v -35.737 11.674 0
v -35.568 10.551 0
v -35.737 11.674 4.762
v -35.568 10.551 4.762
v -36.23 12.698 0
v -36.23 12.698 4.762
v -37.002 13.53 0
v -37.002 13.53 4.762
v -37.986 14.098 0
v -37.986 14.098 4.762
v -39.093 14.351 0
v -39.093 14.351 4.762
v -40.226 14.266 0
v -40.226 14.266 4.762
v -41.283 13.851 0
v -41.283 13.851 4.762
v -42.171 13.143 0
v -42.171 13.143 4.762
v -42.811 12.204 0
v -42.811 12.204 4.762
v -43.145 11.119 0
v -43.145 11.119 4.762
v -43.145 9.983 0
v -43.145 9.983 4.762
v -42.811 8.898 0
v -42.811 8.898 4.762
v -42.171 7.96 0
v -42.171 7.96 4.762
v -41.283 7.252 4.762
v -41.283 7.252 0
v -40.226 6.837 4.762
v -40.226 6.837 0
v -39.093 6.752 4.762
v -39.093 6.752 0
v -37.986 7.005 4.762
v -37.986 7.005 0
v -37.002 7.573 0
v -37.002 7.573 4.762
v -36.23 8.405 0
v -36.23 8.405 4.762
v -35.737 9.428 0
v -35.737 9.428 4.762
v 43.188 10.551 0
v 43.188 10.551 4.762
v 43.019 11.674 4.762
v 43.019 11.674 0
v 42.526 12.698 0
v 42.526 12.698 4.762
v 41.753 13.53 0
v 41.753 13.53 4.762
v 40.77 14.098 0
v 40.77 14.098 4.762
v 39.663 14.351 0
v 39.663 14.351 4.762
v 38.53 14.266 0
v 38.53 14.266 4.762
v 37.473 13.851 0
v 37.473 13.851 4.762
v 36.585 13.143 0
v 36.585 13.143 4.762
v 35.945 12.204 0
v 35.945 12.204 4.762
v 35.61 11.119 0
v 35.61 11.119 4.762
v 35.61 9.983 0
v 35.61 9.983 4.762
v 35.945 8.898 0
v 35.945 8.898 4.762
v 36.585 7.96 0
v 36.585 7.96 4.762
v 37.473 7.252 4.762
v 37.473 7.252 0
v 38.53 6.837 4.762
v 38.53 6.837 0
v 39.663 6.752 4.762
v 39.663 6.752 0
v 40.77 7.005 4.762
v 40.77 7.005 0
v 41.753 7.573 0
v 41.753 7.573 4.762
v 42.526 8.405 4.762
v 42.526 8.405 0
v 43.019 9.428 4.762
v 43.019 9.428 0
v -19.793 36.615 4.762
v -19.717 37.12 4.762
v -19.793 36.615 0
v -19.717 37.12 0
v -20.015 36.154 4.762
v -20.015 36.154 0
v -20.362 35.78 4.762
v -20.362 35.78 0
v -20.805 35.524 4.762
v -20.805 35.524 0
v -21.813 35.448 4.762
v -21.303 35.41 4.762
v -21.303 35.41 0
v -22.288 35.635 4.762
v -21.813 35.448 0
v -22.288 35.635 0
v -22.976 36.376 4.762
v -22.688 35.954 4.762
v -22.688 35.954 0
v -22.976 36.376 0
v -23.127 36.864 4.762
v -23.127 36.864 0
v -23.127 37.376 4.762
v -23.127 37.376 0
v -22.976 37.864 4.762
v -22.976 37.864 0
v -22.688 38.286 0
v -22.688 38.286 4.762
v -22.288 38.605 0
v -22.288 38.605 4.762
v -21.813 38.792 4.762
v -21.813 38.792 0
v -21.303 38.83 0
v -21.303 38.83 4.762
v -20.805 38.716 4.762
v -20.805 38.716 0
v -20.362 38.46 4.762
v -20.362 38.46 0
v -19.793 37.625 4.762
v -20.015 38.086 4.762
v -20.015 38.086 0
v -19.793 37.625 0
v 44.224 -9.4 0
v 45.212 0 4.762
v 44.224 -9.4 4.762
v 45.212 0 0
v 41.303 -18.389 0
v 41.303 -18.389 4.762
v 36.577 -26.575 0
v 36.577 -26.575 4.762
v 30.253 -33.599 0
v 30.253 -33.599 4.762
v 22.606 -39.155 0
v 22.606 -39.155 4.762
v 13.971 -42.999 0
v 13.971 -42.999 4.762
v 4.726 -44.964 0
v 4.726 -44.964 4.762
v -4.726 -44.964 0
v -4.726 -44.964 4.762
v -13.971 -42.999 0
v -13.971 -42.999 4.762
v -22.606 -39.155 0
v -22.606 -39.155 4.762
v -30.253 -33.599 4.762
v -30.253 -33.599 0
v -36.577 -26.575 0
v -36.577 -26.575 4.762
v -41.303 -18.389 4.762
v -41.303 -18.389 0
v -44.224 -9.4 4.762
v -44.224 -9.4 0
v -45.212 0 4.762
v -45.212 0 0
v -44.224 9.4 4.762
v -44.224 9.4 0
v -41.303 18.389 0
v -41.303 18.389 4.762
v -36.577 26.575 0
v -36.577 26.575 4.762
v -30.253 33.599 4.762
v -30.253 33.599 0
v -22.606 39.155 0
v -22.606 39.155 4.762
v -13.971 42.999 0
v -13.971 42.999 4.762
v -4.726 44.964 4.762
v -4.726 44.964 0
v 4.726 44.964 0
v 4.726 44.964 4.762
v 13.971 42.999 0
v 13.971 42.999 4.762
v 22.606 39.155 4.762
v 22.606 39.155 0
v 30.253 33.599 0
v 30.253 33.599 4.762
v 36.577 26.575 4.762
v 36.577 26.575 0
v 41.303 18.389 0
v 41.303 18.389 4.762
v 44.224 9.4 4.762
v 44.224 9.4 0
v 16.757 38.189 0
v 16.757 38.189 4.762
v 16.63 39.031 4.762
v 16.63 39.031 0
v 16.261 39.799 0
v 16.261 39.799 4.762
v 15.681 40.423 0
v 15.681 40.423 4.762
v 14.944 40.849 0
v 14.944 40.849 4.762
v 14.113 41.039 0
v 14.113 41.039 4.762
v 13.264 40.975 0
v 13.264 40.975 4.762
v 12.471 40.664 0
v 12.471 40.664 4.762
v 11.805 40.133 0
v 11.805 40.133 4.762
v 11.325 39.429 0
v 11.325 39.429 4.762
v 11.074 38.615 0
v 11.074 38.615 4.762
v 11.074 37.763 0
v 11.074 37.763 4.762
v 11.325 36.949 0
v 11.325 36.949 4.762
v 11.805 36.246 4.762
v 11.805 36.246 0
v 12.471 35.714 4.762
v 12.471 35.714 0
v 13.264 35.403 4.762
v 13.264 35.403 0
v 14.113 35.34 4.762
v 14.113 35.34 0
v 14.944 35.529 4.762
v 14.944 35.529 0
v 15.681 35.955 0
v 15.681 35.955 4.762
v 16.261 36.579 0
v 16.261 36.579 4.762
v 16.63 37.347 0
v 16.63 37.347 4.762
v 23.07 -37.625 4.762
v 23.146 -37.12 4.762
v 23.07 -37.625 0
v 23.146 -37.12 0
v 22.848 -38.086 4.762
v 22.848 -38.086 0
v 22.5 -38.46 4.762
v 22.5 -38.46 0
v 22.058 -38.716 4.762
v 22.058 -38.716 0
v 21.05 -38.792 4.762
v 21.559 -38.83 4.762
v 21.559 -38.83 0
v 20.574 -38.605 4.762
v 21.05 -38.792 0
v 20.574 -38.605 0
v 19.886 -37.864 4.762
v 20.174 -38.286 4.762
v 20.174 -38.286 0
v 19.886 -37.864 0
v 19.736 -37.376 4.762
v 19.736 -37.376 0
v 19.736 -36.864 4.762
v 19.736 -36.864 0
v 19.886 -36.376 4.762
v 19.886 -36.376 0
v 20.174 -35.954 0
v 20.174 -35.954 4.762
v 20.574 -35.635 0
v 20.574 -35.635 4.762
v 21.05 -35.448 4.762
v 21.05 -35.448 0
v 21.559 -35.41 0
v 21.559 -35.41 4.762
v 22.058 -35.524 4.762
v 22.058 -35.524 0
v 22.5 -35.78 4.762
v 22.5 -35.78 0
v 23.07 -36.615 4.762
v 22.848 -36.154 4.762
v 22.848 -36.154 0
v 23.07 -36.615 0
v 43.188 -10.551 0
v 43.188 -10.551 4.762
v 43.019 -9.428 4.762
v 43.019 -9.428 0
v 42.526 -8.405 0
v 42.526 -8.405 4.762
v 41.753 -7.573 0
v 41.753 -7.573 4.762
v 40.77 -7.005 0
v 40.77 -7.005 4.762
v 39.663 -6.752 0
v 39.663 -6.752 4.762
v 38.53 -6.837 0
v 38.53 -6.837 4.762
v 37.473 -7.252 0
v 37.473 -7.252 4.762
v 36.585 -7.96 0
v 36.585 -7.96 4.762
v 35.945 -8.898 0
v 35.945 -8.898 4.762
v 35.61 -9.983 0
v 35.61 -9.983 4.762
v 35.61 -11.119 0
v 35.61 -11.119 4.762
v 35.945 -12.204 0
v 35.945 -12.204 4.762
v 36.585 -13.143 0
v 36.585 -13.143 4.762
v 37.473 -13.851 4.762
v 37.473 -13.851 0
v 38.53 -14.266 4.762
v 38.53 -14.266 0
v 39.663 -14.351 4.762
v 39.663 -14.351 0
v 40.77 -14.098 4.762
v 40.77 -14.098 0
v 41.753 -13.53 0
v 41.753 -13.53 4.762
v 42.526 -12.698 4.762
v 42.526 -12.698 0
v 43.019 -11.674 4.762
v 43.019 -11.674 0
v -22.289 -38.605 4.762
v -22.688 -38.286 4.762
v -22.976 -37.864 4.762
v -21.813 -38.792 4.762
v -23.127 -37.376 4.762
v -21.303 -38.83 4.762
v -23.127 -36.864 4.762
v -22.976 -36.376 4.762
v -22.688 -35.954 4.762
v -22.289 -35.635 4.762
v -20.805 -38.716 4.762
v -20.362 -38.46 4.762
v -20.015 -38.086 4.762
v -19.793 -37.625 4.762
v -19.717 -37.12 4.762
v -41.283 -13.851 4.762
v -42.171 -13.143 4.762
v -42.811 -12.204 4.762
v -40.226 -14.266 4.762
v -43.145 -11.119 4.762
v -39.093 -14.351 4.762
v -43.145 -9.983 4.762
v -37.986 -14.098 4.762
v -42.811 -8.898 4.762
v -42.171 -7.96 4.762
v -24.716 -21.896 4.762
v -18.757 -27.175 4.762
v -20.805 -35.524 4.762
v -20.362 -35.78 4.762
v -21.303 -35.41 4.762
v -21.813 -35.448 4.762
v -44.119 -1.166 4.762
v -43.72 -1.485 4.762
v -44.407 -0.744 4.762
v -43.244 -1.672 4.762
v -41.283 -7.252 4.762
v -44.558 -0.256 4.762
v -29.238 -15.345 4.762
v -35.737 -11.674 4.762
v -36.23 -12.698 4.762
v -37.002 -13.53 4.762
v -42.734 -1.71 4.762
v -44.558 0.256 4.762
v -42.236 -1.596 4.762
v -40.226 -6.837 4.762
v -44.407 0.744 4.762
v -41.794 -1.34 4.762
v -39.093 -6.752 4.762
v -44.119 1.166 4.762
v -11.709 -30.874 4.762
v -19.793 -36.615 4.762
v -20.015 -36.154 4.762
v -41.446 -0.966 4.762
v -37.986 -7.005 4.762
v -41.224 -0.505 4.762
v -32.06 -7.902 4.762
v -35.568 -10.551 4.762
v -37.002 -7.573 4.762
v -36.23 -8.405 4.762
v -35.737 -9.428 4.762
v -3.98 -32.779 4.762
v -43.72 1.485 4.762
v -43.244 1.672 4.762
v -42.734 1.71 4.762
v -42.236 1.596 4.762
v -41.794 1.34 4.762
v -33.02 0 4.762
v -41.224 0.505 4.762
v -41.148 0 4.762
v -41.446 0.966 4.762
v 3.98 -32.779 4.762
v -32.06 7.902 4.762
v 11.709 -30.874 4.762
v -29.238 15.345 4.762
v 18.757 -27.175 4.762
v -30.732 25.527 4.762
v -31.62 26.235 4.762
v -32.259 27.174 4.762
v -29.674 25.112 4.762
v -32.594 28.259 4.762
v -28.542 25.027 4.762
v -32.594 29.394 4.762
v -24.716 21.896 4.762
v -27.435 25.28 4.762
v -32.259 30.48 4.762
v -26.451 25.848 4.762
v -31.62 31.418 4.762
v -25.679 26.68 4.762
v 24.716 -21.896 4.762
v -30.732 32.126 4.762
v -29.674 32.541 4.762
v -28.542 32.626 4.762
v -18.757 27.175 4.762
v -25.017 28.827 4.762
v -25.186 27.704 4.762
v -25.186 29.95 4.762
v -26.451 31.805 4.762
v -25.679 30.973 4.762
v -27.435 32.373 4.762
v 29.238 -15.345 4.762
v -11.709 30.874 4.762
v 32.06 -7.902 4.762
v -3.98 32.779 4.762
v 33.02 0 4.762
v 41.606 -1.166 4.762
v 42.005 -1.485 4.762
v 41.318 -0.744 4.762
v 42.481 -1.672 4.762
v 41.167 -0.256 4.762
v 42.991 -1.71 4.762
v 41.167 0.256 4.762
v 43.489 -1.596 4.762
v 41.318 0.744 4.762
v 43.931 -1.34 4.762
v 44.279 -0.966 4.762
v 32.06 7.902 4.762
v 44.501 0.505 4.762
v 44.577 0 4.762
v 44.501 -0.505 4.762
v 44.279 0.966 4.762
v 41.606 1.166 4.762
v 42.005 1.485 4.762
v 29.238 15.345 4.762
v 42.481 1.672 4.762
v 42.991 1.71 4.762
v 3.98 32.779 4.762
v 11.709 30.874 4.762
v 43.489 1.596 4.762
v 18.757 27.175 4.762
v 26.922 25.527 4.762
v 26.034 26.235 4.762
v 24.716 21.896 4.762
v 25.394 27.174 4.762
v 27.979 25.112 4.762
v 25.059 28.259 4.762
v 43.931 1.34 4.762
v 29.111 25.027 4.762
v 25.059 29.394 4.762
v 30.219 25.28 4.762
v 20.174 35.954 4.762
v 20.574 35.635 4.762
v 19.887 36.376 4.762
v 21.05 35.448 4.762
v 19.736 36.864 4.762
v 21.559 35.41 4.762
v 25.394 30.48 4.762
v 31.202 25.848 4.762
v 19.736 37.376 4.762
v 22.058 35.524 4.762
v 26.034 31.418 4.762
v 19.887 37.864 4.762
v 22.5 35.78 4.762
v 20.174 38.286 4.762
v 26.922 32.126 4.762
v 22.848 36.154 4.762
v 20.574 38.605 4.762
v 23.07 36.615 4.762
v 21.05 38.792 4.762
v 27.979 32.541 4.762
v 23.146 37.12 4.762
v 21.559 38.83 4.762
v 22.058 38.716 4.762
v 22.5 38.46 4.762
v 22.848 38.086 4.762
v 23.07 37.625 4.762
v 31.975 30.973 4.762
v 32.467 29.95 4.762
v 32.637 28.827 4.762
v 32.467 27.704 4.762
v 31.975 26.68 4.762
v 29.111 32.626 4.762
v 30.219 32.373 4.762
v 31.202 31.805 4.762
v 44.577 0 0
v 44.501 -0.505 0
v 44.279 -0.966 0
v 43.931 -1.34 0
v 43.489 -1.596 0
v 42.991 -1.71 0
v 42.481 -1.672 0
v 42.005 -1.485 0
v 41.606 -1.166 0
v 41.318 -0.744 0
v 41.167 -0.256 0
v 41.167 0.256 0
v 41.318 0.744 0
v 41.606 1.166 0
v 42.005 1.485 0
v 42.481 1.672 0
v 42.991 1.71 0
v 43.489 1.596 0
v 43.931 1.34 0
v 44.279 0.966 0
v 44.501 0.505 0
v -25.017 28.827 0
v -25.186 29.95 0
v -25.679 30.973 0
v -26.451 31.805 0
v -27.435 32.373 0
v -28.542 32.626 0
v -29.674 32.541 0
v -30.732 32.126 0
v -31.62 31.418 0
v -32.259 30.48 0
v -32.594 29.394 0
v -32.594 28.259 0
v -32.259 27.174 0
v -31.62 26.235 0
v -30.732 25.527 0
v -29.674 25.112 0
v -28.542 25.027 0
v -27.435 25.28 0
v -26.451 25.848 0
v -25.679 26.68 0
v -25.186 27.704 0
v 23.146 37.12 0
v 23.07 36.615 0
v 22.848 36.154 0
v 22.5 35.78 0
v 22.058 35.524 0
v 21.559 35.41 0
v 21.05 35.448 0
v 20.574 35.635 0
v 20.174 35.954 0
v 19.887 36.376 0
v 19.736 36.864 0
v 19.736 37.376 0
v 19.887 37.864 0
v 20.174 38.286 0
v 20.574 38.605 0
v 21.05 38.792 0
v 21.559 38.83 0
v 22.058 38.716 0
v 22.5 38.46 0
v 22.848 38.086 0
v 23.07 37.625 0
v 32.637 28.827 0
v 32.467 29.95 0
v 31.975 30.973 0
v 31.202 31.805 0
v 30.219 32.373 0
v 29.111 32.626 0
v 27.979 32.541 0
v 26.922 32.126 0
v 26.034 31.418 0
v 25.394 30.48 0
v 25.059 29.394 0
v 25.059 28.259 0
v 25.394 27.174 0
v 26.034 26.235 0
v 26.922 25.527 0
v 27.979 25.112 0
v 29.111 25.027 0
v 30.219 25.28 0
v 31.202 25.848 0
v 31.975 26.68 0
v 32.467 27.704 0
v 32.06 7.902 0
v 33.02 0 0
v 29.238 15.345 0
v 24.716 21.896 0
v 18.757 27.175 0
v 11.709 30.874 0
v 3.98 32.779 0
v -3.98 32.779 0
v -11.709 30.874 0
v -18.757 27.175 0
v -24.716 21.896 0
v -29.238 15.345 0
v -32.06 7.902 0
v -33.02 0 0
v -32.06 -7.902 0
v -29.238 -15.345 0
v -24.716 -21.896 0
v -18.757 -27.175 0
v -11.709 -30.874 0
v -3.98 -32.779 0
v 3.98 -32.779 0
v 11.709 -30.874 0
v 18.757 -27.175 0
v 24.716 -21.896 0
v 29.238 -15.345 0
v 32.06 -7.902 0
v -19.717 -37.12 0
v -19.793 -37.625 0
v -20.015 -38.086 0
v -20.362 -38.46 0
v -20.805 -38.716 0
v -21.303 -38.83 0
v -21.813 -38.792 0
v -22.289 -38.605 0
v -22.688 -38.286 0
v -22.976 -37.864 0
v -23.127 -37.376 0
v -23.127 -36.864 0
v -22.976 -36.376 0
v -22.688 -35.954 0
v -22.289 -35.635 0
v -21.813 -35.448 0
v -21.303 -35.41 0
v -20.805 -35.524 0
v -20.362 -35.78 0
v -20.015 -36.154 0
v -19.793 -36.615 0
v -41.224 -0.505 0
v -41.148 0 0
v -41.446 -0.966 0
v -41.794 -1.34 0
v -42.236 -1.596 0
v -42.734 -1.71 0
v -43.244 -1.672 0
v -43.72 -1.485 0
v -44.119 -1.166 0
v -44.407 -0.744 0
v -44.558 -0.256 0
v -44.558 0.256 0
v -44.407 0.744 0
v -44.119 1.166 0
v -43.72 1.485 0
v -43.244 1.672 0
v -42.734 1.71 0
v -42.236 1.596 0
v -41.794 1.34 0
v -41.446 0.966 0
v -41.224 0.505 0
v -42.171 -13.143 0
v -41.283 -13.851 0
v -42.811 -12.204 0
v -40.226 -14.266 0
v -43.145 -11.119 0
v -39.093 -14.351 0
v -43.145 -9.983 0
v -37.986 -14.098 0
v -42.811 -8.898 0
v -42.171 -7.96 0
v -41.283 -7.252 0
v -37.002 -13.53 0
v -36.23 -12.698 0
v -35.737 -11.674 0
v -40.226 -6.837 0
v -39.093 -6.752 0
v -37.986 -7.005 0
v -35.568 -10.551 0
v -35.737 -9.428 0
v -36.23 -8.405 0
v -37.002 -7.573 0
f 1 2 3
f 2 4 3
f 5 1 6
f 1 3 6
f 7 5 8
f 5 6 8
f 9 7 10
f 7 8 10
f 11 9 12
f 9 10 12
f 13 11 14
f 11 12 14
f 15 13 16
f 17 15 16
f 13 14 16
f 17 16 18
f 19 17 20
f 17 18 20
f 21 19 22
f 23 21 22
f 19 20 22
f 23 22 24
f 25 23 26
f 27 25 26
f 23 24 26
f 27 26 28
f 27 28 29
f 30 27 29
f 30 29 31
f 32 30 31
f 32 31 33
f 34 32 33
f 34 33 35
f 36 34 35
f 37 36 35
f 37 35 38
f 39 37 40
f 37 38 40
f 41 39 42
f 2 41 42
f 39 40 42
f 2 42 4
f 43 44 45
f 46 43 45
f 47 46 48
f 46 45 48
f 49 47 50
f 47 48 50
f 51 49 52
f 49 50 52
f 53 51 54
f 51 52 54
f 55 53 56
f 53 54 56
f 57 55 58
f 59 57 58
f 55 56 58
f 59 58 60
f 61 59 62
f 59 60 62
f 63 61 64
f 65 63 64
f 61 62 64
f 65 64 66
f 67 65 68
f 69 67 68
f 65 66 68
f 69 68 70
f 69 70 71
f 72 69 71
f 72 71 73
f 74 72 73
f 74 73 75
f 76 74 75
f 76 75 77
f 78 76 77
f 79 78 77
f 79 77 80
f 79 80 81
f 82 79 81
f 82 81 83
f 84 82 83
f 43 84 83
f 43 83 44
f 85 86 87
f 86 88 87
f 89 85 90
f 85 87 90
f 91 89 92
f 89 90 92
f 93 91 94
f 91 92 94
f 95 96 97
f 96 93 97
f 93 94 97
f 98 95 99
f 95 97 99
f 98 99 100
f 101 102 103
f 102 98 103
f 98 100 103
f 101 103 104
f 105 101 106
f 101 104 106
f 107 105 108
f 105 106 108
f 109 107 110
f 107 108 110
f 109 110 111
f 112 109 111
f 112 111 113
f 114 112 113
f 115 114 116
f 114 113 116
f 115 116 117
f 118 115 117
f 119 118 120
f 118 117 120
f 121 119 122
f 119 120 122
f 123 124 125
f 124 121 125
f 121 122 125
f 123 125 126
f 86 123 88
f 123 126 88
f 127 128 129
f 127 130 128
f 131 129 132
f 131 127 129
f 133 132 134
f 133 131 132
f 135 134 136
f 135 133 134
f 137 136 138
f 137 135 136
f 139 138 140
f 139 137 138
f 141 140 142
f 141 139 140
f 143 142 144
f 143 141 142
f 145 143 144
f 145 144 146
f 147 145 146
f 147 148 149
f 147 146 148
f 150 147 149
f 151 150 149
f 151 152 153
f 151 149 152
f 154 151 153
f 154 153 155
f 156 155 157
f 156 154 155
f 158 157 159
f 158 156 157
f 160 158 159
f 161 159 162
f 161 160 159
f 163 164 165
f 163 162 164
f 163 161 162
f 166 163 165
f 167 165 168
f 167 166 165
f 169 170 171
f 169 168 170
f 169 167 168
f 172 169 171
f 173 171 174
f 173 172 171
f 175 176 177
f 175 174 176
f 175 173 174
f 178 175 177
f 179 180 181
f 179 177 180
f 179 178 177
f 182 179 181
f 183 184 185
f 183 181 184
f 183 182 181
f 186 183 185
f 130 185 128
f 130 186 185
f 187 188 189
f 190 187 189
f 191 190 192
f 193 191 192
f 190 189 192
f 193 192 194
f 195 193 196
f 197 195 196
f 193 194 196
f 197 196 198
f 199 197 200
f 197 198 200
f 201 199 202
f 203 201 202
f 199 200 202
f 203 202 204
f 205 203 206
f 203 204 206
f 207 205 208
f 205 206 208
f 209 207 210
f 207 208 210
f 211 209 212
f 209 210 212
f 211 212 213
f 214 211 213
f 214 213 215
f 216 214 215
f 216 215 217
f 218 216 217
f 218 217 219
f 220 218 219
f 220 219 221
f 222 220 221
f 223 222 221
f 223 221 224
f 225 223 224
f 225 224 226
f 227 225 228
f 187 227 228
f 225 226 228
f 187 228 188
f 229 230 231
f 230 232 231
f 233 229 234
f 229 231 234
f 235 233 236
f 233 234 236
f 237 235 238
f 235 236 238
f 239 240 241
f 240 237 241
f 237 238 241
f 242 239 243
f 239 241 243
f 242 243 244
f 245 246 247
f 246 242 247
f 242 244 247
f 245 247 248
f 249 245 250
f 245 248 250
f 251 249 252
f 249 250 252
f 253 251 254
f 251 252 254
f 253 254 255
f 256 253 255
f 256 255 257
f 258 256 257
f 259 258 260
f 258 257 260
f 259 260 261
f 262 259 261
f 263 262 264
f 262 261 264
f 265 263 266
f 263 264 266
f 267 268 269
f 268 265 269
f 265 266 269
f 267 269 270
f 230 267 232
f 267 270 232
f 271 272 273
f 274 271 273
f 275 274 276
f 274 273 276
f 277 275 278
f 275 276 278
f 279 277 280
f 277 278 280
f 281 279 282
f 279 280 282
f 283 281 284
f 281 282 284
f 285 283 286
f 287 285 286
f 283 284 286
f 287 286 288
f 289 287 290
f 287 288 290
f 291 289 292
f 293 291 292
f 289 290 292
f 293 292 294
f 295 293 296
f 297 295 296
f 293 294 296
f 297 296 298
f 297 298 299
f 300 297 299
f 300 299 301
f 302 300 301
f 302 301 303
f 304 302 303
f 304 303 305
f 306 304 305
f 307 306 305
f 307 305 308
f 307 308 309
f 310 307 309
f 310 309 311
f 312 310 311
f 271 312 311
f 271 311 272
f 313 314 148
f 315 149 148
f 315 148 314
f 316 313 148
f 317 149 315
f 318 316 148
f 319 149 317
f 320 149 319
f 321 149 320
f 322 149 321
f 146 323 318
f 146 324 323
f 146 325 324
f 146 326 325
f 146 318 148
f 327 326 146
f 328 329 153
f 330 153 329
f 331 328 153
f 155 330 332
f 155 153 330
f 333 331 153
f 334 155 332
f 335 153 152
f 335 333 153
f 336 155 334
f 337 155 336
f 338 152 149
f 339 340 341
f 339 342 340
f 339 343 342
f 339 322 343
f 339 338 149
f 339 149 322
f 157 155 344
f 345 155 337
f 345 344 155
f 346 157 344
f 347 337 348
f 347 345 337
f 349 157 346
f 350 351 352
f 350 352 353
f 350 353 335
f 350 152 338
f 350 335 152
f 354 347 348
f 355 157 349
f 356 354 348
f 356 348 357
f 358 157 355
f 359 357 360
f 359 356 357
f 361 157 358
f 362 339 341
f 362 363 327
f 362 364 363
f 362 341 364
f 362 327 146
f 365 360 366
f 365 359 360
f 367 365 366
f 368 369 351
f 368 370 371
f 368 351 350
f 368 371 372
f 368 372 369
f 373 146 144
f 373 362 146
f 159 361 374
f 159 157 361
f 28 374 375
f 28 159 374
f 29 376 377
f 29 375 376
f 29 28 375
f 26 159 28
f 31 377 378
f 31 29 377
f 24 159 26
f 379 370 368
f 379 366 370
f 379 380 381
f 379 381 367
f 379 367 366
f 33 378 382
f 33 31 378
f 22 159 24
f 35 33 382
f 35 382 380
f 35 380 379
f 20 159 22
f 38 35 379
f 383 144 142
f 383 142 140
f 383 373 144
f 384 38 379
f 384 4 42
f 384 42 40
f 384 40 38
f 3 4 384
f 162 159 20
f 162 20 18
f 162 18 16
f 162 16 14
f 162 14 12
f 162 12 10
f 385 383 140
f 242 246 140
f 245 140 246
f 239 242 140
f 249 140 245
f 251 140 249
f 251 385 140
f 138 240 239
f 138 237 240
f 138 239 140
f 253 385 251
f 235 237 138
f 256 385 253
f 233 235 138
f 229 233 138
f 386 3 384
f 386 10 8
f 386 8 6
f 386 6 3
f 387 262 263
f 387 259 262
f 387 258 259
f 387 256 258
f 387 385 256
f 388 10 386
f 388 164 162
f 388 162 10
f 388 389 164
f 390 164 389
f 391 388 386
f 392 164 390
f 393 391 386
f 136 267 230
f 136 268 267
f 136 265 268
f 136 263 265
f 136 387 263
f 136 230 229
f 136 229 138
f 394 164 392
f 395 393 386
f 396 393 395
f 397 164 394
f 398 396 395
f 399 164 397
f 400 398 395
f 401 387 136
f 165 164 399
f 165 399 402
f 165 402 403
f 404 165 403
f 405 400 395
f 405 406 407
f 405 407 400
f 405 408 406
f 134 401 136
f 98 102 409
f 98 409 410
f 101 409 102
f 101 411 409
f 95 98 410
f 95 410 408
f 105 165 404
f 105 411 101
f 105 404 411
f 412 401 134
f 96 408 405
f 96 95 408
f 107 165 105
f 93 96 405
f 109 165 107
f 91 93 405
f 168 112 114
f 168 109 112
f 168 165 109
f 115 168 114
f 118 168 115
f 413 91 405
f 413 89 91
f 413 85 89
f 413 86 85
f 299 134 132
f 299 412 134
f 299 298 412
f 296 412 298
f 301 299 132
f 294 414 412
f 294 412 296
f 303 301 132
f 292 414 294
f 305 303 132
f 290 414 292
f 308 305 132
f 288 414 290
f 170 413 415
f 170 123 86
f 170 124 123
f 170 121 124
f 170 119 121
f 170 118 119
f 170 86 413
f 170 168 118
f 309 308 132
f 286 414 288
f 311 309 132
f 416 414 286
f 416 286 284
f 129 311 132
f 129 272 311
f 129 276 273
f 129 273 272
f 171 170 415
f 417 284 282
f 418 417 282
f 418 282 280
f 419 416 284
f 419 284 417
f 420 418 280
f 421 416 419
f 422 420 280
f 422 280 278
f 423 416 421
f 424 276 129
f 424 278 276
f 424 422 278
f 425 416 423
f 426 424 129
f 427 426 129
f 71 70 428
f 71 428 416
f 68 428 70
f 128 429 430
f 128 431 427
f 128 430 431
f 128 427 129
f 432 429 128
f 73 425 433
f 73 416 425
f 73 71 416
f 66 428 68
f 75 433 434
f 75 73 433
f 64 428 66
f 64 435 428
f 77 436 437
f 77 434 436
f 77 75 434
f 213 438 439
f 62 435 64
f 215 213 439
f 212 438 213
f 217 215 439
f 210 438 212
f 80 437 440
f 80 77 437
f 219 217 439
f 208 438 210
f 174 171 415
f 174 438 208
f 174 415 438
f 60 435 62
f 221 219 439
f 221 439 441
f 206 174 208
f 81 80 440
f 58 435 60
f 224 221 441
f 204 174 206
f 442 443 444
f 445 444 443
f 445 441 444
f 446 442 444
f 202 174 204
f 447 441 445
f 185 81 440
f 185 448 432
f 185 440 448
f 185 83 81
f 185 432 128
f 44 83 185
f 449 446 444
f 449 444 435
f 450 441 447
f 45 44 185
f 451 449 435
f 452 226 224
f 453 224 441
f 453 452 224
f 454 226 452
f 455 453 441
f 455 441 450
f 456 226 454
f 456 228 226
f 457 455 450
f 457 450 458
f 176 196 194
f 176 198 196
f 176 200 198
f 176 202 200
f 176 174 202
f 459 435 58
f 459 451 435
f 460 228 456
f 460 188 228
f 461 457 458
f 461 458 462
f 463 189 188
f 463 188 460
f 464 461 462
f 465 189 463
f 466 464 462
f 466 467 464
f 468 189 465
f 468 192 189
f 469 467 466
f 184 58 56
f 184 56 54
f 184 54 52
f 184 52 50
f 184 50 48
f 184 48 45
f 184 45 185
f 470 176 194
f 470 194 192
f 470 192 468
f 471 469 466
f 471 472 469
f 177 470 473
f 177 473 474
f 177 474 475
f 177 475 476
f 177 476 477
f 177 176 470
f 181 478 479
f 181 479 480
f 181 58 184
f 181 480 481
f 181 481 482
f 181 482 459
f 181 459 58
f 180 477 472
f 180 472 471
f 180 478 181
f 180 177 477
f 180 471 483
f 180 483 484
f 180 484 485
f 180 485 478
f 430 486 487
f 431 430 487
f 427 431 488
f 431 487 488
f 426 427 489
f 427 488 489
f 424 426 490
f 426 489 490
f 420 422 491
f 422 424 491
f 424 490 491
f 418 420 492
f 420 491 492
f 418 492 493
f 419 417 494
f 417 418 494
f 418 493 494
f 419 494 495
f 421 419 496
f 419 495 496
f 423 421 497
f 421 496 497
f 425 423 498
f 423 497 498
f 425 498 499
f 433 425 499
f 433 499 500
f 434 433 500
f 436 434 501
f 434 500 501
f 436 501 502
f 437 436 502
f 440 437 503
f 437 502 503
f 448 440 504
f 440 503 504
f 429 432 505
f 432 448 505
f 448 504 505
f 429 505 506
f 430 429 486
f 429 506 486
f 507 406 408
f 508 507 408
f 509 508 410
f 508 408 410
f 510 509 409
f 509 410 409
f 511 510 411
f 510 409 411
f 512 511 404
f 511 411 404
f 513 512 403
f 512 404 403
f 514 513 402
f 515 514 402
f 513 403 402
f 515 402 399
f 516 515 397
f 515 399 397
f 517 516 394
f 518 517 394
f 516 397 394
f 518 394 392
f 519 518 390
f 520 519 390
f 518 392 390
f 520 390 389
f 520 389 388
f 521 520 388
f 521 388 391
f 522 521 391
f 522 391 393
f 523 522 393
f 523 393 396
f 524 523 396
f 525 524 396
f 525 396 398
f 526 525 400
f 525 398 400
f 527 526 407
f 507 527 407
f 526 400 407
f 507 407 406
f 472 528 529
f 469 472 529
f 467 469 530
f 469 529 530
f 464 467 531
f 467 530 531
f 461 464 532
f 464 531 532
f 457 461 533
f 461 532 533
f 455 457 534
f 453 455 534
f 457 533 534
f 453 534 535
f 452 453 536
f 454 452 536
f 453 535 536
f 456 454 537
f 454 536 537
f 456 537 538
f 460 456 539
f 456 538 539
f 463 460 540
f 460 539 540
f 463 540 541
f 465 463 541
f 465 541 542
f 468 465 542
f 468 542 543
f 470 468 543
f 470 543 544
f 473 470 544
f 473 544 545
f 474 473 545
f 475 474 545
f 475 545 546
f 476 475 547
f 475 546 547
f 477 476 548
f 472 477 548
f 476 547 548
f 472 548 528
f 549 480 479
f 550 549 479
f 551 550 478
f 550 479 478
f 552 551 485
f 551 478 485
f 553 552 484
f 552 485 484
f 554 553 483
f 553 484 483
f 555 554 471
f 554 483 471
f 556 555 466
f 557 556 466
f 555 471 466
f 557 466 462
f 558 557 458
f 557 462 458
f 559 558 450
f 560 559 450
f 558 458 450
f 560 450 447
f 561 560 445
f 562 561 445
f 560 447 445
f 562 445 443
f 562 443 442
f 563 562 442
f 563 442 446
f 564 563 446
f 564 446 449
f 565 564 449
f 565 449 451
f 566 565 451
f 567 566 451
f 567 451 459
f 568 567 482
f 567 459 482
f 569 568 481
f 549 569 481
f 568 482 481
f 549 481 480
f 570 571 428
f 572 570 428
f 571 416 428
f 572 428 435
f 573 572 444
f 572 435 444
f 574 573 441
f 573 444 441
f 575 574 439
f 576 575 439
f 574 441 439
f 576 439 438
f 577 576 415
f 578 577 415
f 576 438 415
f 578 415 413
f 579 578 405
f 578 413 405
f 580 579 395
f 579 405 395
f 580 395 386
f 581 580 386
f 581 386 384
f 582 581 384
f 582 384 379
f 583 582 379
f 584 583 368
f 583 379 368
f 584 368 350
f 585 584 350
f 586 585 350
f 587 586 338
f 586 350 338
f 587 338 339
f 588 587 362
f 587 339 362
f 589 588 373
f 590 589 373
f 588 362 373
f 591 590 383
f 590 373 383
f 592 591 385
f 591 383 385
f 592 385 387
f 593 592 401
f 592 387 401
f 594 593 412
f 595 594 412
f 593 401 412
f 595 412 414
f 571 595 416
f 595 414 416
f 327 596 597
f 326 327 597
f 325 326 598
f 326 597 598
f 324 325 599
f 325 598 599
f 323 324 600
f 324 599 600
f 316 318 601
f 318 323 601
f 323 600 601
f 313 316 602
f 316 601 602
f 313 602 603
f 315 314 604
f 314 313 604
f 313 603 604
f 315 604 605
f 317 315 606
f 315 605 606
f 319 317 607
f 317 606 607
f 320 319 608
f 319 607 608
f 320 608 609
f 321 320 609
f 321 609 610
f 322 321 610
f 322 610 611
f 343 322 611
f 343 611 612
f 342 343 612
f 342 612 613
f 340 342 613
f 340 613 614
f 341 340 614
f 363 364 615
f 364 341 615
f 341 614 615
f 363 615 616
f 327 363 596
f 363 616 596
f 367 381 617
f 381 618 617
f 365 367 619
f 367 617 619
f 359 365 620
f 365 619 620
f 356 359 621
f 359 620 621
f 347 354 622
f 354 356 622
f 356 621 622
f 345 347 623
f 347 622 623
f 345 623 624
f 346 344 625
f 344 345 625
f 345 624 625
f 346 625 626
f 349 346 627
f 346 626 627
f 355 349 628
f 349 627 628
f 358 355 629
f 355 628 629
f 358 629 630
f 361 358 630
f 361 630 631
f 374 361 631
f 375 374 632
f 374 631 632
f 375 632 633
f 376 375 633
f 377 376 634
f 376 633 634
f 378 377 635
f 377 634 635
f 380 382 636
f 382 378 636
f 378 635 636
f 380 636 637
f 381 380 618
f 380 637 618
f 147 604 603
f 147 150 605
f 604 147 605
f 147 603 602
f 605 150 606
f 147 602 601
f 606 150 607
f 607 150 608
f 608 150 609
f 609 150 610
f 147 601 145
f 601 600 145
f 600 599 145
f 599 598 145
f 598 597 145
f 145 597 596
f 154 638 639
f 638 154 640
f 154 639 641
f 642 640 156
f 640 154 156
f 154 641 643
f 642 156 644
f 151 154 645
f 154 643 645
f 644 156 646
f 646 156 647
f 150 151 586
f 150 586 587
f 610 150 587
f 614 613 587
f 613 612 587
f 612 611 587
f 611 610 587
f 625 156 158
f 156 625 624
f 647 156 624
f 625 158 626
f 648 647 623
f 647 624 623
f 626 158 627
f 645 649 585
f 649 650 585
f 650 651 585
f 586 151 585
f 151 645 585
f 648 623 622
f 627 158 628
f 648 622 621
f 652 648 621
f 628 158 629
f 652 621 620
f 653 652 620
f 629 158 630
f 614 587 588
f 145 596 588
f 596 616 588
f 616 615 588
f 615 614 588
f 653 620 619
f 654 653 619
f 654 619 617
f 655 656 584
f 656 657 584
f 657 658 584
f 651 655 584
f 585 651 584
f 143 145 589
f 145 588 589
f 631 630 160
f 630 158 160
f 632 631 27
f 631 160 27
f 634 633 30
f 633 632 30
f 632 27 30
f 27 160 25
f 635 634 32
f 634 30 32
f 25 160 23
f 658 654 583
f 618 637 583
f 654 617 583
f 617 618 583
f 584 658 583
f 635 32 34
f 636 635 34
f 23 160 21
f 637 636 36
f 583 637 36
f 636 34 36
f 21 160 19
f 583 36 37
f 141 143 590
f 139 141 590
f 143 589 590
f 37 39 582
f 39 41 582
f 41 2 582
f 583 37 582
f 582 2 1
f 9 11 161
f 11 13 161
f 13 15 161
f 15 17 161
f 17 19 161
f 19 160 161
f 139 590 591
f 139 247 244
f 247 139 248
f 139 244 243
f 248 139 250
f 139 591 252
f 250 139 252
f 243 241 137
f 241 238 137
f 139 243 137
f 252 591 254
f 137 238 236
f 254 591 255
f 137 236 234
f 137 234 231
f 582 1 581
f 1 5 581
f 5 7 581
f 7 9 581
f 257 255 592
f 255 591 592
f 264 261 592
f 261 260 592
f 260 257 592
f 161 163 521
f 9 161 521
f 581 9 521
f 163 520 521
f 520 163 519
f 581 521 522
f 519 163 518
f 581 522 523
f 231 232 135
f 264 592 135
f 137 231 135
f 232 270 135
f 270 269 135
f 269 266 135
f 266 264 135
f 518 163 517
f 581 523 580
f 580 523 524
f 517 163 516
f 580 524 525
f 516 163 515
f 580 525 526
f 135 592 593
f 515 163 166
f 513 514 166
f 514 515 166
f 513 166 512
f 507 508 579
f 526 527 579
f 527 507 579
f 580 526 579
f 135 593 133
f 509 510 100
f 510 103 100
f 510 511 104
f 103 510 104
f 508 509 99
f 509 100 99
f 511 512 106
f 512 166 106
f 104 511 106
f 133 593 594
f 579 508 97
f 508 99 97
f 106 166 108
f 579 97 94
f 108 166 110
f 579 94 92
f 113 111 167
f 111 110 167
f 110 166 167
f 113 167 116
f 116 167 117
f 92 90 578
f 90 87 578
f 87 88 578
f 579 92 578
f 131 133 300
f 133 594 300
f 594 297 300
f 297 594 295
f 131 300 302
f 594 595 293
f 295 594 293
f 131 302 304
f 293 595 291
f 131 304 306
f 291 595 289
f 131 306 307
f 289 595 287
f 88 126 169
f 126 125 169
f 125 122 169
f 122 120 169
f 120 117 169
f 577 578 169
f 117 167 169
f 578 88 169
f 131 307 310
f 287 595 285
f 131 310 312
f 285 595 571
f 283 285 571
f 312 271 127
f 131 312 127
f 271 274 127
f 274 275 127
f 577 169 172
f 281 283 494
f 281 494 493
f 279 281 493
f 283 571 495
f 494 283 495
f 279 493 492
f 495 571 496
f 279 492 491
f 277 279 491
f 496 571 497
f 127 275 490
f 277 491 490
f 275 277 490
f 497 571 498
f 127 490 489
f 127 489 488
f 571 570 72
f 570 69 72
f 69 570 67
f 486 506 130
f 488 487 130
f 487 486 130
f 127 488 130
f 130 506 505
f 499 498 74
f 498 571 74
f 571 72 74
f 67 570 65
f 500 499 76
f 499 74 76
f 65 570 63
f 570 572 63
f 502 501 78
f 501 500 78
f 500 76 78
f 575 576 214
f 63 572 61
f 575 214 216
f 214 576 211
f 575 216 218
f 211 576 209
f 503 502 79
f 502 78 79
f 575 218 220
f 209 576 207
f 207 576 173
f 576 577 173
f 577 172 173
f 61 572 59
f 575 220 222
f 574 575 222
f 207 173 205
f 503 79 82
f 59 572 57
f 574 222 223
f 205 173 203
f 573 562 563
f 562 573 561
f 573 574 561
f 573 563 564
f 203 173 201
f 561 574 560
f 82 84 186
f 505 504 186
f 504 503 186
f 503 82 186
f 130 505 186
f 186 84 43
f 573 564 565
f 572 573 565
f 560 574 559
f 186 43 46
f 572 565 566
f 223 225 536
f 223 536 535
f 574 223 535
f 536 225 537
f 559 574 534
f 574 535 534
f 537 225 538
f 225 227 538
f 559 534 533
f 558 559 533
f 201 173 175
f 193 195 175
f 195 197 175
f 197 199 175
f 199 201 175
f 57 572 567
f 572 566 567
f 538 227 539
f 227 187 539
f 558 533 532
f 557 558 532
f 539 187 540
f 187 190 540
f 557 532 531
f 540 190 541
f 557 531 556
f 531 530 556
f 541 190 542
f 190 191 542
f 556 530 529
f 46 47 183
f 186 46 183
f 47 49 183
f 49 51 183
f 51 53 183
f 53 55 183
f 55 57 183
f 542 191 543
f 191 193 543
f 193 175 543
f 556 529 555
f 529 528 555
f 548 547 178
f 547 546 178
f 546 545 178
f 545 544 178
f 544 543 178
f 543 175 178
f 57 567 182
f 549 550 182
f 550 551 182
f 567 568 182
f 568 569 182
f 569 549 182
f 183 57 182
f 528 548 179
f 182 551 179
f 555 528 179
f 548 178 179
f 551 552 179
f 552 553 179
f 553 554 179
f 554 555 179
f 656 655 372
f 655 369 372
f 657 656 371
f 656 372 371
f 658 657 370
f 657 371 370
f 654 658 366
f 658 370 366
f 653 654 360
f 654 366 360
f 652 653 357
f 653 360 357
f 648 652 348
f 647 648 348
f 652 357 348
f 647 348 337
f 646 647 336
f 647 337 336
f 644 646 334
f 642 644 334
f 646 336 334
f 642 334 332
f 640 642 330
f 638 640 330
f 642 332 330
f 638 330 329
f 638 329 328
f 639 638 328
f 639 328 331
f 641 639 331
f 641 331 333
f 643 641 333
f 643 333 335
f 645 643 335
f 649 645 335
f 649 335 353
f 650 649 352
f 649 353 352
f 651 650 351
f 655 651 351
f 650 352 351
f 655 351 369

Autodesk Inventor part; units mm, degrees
ref_plane "YZ Plane" through (0, 0, 0) normal (1, 0, 0) x (0, 1, 0)
ref_plane "XZ Plane" through (0, 0, 0) normal (0, 1, 0) x (-1, 0, 0)
ref_plane "XY Plane" through (0, 0, 0) normal (0, 0, 1) x (1, 0, 0)
sketch "Sketch1" plane through (0, 0, 0) normal (0, 0, 1) x (1, 0, 0)
  circle A0 centre (0, 0) radius 45.212
  line L0 (0, 0) -> (21.4313, 37.12)
  line L1 (0, 0) -> (42.8625, 0) construction
  circle A1 centre (21.4313, 37.12) radius 1.7145
  circle A2 centre (-21.4312, 37.12) radius 1.7145
  circle A3 centre (-42.8625, 0) radius 1.7145
  circle A4 centre (-21.4313, -37.12) radius 1.7145
  circle A5 centre (21.4312, -37.12) radius 1.7145
  circle A6 centre (42.8625, 0) radius 1.7145
  dimension "d0" = 90.424
  dimension "d1" = 42.8625
  dimension "d2" = 60
  dimension "d3" = 3.429
  dimension "d6" = 360
extrude "Extrusion1" add sketch "Sketch1" along normal blind 4.7625
sketch "Sketch2" plane through (0, 0, 4.7625) normal (0, 0, 1) x (1, 0, 0)
  circle A0 centre (0, 0) radius 33.02
  dimension "d10" = 66.04
extrude "Extrusion2" cut sketch "Sketch2" against normal blind 25.4
sketch "Sketch8" plane through (0, 0, 4.7625) normal (0, 0, 1) x (1, 0, 0)
  circle A0 centre (0, 0) radius 33.02 projected
  circle A1 centre (42.8625, 0) radius 1.7145 projected
  circle A2 centre (21.4312, -37.12) radius 1.7145 projected
  circle A3 centre (-21.4313, -37.12) radius 1.7145 projected
  circle A4 centre (-42.8625, 0) radius 1.7145 projected
  circle A5 centre (-21.4312, 37.12) radius 1.7145 projected
  circle A6 centre (21.4313, 37.12) radius 1.7145 projected
  circle A7 centre (0, 0) radius 45.212 projected
  circle A8 centre (0, 0) radius 38.1
  circle A9 centre (39.3779, 10.5513) radius 3.81
  circle A10 centre (39.3779, 10.5513) radius 2.4447
  line L0 (0, 0) -> (39.3779, 10.5513)
  line L1 (0, 0) -> (36.2951, 20.955)
  line L2 (0, 0) -> (41.91, 0) construction
  circle A11 centre (36.2951, 20.955) radius 1.5875
  line L3 (0, 0) -> (0, 9.3613)
  circle A12 centre (39.3779, -10.5513) radius 3.81
  circle A13 centre (-39.3779, 10.5513) radius 3.81
  circle A14 centre (-39.3779, -10.5513) radius 3.81
  circle A15 centre (28.8266, 28.8266) radius 3.81
  line L4 (21.4313, 37.12) -> (0, 0)
  line L5 (0, 0) -> (28.8266, 28.8266)
  circle A16 centre (-28.8266, 28.8266) radius 3.81
  dimension "d37" = 76.2
  dimension "d38" = 7.62
  dimension "d39" = 4.8895
  dimension "d40" = 40.767
  dimension "d42" = 41.91
  dimension "d43" = 30
  dimension "d44" = 3.175
  dimension "d45" = 15
  dimension "d49" = 7.62
  dimension "d50" = 15
  dimension "d51" = 40.767
extrude "Extrusion6" cut sketch "Sketch8" against normal blind 25.4 contours L0 A8 A9 | A9 A8 L0 | A10 | A9 A8 | A12 A8 | A8 A12 | A13 A8 | A8 A13 | A14 A8 | A8 A14
extrude "Extrusion7" cut sketch "Sketch8" against normal blind 25.4 contours L5 A8 A15 | A15 A8 L5 | A15 A8 | A16 A8 | A8 A16
sketch "Sketch11" plane through (0, 0, 4.7625) normal (0, 0, 1) x (1, 0, 0)
  circle A0 centre (13.8997, 38.1891) radius 2.8575
  line L0 (0, 0) -> (13.8997, 38.1891) construction
  line L1 (0, 0) -> (40.64, 0) construction
  dimension "d55" = 5.715
  dimension "d56" = 70
  dimension "d57" = 40.64
extrude "Extrusion8" cut sketch "Sketch11" against normal through all
equation "\"d49\" = d38"
equation "\"d50\" = d45"
equation "\"d51\" = d40"
properties part number "forwardBallastSealingWallDisc" material "Aluminum 6061"
